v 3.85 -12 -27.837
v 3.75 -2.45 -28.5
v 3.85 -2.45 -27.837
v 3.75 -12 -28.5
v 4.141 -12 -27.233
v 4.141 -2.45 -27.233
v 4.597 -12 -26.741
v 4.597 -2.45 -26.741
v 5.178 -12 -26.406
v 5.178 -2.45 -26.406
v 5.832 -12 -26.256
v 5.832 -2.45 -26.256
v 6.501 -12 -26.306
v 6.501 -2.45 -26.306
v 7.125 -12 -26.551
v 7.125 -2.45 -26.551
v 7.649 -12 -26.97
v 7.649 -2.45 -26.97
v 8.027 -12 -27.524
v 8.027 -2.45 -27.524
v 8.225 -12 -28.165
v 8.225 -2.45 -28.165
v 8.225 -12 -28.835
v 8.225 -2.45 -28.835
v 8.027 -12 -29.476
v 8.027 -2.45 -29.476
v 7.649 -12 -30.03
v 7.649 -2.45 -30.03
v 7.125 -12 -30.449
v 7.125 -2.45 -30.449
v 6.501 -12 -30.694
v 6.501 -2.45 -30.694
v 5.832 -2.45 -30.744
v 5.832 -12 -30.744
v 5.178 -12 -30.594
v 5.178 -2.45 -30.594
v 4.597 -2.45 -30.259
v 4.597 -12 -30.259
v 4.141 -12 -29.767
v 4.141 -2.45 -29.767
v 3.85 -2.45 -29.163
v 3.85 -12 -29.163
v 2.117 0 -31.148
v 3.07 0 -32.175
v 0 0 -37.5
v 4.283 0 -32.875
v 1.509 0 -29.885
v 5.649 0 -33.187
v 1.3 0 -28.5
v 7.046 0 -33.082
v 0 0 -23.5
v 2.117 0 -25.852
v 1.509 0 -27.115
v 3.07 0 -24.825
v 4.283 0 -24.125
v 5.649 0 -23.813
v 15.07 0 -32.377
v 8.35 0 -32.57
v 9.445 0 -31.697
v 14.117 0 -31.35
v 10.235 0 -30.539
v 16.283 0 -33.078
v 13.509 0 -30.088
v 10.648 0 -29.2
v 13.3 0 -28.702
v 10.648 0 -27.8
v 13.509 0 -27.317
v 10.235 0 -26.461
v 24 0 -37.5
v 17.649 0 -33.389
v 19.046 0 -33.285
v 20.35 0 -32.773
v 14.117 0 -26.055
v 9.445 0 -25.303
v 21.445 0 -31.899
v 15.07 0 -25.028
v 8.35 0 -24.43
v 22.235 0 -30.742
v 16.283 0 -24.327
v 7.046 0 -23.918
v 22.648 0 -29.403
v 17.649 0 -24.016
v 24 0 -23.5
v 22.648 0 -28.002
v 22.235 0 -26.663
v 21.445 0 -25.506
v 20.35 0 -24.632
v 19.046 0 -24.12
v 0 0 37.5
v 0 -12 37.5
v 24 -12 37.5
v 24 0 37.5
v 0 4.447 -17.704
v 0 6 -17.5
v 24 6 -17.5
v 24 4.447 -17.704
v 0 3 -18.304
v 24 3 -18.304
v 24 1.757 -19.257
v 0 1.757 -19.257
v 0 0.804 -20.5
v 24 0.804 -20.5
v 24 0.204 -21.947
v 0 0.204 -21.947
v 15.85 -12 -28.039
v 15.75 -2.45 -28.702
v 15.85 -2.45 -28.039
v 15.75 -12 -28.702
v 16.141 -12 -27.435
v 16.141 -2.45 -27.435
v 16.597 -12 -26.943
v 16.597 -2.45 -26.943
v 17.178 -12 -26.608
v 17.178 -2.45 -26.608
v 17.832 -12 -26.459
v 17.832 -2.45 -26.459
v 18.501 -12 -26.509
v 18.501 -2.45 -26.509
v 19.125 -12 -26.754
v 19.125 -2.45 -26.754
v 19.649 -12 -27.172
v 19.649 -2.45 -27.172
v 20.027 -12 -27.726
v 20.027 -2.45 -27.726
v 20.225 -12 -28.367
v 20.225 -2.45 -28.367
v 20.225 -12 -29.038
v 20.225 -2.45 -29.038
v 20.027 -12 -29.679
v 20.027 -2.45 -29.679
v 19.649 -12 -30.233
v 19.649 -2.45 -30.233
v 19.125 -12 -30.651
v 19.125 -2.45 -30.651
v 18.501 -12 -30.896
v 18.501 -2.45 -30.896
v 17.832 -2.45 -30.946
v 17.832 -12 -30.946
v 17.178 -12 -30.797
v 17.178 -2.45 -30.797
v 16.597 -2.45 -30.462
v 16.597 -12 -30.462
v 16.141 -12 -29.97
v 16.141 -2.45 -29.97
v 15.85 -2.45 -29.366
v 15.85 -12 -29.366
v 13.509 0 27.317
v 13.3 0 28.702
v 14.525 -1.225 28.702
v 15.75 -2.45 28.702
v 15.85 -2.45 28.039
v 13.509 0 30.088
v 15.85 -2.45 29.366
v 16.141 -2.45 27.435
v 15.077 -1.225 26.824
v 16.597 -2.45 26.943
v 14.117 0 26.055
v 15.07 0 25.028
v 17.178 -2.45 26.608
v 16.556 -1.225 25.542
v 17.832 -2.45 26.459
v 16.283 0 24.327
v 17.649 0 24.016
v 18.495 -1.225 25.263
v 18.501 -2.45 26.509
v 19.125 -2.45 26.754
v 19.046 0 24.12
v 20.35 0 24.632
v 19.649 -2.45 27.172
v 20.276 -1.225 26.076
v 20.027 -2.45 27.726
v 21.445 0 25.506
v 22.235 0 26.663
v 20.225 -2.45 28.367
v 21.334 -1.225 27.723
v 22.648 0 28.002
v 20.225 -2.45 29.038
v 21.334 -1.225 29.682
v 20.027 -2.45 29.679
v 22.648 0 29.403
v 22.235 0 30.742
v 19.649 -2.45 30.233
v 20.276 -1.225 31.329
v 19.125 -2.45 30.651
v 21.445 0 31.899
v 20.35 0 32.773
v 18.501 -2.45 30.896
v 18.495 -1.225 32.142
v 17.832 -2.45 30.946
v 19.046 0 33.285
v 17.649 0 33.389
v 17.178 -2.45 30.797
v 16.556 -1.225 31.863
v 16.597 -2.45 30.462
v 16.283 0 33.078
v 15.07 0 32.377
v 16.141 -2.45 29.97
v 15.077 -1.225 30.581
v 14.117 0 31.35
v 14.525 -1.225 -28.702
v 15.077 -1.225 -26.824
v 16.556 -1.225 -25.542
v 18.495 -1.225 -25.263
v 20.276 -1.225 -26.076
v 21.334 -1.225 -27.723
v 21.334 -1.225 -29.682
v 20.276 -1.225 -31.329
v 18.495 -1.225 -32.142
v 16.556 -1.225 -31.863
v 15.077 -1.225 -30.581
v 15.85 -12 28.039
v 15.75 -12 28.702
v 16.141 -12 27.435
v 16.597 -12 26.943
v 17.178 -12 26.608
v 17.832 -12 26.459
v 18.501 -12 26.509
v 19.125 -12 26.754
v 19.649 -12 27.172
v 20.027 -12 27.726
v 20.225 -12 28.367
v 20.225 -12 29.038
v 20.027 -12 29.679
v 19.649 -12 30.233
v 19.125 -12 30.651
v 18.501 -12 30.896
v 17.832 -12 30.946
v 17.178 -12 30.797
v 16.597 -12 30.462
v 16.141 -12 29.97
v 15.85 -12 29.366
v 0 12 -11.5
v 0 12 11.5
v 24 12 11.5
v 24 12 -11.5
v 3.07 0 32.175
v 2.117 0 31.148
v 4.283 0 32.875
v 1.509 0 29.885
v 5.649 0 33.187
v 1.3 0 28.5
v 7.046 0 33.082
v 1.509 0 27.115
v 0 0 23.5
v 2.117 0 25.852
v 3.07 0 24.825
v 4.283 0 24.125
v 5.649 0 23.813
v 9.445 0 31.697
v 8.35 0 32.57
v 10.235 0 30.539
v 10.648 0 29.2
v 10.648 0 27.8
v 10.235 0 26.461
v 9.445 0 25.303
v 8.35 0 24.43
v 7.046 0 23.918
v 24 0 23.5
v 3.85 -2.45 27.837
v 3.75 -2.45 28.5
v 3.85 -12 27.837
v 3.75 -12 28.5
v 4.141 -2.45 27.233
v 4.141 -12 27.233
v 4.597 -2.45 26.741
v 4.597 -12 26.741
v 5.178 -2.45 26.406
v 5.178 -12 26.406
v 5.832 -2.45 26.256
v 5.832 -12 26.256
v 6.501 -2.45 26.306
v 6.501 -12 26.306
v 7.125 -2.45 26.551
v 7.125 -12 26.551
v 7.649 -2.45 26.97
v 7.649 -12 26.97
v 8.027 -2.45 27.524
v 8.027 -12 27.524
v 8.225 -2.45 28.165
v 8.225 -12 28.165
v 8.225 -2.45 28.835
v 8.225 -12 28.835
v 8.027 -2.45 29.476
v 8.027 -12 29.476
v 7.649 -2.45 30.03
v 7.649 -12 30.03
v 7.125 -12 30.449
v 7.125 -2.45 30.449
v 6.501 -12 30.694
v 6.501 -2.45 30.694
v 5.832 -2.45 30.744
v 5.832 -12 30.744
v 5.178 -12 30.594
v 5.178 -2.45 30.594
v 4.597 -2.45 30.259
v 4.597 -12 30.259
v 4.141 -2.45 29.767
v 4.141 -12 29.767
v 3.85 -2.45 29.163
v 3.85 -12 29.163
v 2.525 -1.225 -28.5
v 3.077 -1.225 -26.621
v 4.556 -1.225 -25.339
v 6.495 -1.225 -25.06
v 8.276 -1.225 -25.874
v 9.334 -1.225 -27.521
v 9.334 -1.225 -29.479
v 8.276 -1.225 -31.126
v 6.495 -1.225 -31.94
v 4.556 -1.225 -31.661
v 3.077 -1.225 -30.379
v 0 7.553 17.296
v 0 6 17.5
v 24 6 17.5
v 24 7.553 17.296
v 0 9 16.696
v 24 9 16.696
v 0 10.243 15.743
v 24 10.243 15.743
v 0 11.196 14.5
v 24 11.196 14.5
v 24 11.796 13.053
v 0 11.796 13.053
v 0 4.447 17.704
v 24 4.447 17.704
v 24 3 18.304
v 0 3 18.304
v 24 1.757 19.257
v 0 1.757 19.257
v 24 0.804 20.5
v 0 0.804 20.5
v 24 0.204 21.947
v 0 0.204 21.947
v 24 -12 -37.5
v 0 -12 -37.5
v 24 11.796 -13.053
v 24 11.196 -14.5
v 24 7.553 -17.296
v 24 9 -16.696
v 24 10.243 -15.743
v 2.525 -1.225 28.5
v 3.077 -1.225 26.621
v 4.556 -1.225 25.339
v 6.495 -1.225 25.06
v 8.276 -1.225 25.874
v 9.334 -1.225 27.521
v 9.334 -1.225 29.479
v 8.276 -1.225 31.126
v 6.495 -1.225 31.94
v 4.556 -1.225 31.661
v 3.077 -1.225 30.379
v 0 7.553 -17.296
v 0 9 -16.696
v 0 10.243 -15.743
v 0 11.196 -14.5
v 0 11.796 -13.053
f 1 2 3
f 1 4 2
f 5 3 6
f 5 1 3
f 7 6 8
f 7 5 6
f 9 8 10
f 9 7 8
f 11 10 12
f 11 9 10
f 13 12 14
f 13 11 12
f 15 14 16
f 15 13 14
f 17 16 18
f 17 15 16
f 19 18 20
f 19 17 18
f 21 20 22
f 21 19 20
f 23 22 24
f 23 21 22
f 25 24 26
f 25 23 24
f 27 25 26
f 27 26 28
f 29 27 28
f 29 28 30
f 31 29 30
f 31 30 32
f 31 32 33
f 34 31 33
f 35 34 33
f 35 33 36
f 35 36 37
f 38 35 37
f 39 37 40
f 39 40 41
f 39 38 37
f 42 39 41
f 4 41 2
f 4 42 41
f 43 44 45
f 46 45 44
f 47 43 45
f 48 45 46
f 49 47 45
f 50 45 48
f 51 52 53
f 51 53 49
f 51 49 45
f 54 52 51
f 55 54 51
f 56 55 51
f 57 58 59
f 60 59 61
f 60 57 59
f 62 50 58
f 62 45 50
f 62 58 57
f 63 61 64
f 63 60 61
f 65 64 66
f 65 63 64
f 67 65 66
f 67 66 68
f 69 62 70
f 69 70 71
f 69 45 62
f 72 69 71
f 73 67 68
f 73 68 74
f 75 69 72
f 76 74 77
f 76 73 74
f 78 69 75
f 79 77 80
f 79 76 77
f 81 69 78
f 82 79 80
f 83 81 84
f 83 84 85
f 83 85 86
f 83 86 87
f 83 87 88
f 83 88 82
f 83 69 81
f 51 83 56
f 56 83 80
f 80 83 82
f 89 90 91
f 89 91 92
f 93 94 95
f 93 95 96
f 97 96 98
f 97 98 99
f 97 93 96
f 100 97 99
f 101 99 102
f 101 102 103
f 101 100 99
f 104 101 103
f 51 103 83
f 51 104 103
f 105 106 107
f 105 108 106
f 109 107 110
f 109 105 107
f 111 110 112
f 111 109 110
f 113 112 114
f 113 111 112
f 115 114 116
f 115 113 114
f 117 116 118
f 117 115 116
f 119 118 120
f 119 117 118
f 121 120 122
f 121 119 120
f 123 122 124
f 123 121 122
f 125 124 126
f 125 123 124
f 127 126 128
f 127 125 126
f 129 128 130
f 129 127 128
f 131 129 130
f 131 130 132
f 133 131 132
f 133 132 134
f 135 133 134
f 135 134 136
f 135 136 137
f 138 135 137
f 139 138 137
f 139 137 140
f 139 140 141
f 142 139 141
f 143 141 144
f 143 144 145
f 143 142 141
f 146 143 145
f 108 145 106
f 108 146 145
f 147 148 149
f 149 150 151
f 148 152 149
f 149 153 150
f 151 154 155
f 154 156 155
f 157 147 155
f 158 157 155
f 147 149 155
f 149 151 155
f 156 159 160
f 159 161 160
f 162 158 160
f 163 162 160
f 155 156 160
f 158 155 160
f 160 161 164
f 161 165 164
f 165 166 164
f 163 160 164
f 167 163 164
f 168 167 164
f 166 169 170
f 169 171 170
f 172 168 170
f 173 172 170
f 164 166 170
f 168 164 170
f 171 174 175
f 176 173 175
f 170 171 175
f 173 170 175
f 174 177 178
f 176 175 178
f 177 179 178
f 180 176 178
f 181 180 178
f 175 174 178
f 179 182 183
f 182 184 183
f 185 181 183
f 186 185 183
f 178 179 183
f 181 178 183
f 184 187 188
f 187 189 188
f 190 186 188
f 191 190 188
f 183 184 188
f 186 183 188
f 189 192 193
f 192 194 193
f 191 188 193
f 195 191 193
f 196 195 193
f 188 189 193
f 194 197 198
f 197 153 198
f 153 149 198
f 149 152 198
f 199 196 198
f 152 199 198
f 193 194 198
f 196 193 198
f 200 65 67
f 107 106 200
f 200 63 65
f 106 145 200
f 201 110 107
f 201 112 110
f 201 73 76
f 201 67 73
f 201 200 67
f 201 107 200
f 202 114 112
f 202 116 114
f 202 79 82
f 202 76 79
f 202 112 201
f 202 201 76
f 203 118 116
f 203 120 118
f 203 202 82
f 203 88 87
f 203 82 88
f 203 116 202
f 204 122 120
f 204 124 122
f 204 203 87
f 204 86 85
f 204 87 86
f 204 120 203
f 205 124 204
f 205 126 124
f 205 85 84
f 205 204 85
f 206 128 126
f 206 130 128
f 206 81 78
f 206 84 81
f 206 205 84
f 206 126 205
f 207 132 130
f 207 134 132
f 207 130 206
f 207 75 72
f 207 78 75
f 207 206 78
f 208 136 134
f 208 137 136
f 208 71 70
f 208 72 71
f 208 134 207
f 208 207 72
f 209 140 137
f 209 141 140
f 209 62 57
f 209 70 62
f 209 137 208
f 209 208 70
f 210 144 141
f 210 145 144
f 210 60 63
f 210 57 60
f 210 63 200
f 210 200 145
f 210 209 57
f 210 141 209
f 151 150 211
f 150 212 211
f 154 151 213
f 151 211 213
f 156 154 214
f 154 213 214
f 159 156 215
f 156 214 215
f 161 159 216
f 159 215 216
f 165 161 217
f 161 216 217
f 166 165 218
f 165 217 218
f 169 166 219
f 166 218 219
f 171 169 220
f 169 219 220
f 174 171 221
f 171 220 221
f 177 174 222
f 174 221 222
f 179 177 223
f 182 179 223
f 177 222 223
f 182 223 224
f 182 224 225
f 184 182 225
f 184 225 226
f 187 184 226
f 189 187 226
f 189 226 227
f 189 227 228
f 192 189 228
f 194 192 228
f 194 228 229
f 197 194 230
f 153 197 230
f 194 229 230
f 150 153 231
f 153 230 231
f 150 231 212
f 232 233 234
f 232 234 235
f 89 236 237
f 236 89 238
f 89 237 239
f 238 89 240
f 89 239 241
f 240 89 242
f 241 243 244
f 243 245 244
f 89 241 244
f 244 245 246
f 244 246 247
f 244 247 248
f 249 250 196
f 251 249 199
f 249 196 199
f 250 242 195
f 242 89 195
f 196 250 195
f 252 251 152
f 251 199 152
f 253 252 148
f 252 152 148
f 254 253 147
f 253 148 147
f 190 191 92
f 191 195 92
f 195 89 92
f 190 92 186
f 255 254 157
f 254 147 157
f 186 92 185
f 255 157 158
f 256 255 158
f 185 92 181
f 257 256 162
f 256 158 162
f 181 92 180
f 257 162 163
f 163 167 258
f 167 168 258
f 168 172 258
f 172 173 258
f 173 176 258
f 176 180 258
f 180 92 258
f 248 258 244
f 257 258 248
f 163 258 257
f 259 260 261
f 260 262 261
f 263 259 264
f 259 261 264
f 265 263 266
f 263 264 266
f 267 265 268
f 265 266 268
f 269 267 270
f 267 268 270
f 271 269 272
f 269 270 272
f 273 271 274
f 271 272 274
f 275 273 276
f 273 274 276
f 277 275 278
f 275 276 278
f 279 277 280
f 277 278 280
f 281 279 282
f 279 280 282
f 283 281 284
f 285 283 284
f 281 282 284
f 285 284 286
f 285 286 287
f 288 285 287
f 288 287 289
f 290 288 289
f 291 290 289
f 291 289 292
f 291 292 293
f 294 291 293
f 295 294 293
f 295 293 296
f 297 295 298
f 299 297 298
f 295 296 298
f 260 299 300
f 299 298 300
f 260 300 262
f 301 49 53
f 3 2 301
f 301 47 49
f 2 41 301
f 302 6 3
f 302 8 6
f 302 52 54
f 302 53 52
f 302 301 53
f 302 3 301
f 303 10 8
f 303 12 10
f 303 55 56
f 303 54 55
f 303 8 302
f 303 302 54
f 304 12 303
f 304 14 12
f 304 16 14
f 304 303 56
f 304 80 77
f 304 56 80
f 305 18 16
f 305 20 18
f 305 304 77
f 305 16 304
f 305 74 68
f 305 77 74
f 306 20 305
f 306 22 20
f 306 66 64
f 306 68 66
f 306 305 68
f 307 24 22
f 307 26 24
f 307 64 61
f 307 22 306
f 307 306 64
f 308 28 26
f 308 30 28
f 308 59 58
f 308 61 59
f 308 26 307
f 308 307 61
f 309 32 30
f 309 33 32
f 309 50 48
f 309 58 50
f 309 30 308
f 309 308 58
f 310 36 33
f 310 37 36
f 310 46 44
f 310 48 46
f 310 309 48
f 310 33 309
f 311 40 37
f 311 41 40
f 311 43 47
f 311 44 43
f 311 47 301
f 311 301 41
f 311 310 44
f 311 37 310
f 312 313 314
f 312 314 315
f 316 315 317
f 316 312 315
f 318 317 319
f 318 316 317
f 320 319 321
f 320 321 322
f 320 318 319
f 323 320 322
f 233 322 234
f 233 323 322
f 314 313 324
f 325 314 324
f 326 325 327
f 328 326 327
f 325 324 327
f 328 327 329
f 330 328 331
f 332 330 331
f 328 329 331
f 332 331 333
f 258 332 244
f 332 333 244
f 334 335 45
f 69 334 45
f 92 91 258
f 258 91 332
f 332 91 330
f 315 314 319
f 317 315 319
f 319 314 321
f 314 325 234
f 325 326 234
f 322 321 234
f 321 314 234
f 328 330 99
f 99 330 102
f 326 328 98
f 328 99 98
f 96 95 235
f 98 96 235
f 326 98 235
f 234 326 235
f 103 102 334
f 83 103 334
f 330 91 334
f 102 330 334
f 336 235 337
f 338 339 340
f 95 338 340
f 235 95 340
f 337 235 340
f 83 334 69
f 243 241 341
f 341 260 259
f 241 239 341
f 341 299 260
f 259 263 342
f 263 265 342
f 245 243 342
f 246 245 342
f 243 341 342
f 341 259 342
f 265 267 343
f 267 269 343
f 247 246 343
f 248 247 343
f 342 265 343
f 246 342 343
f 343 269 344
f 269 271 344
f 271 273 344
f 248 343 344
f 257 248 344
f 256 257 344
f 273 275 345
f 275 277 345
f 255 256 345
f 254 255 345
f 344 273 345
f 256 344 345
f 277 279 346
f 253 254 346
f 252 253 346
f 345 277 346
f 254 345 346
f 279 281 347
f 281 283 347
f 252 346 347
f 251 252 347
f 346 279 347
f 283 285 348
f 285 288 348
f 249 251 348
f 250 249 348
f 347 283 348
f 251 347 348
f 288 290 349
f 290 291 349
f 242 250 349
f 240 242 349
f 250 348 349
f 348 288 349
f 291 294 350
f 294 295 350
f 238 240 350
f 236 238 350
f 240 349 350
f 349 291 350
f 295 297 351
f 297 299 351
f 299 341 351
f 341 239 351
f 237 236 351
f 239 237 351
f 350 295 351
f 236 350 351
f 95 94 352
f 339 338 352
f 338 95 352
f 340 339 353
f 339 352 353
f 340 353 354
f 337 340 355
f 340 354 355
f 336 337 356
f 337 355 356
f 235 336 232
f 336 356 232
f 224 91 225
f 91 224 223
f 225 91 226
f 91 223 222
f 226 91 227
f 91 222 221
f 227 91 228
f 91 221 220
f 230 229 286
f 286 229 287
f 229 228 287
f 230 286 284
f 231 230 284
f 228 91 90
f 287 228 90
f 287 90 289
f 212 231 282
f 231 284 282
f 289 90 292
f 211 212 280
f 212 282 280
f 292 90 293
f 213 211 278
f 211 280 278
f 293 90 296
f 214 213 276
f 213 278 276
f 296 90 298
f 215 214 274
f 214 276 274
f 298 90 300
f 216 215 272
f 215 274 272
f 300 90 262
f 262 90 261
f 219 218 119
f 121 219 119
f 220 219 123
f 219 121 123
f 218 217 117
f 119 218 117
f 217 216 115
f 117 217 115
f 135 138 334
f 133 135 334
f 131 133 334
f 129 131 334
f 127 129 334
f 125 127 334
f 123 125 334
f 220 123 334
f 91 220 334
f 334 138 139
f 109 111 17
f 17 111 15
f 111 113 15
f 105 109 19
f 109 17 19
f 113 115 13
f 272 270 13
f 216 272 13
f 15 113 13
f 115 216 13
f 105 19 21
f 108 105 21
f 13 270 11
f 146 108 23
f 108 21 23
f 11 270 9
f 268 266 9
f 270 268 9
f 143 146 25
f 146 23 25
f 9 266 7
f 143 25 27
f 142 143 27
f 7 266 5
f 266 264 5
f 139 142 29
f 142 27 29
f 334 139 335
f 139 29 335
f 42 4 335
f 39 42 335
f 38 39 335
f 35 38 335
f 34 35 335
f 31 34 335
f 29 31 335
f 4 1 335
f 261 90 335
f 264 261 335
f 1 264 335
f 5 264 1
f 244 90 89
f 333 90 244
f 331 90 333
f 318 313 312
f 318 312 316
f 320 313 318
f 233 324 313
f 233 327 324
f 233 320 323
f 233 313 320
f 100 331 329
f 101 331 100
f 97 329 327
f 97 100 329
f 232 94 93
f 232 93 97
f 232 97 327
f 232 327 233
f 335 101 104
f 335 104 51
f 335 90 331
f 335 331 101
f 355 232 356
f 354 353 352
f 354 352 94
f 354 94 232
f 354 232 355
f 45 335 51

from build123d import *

# Parameters (mm, degrees)
SKETCH1_W                                       = 75
SKETCH1_H                                       = 24
BOSS_EXTRUDE1_DEPTH                             = 24
SKETCH2_W                                       = 20
SKETCH2_H                                       = 12
CUT_EXTRUDE1_DEPTH                              = 24
FILLET1_START                                   = -1
FILLET1_DEPTH                                   = 26
FILLET1_2_DEPTH                                 = 24
CSK_FOR_M4_FLAT_HEAD_MACHINE_SCREW1_D           = 4.5
CSK_FOR_M4_FLAT_HEAD_MACHINE_SCREW1_CSINK_D     = 9.4
CSK_FOR_M4_FLAT_HEAD_MACHINE_SCREW1_CSINK_ANGLE = 90


with BuildPart() as part:
    # Sketch1 → Boss-Extrude1 (new body)
    with BuildSketch(Plane(origin=(0, 0, 0), x_dir=(0, 0, -1), z_dir=(1, 0, 0))):
        Rectangle(SKETCH1_W, SKETCH1_H)
    extrude(amount=BOSS_EXTRUDE1_DEPTH)

    # Sketch2 → Cut-Extrude1 (cut)
    with BuildSketch(Plane(origin=(24, 0, 0), x_dir=(0, 0, -1), z_dir=(1, 0, 0))):
        with Locations((-27.5, 6)):
            Rectangle(SKETCH2_W, SKETCH2_H)
    cut_extrude1 = extrude(amount=-CUT_EXTRUDE1_DEPTH, mode=Mode.SUBTRACT)

    # Fillet1: read off the stored shape, not the designer's step
    # Fillet1 outline → Fillet1 (cut)
    with BuildSketch(Plane.YZ.offset(FILLET1_START)):
        with BuildLine():
            Line((12, 17.5), (6, 17.5))
            ThreePointArc((6, 17.5), (10.242640687, 15.742640687), (12, 11.5))
            Line((12, 11.5), (12, 17.5))
        make_face()
    fillet1 = extrude(amount=FILLET1_DEPTH, mode=Mode.SUBTRACT)

    # Fillet1 2 outline → Fillet1 2 (add)
    with BuildSketch(Plane.YZ):
        with BuildLine():
            Line((0, 17.5), (6, 17.5))
            ThreePointArc((6, 17.5), (1.757359313, 19.257359313), (0, 23.5))
            Line((0, 23.5), (0, 17.5))
        make_face()
    fillet1_2 = extrude(amount=FILLET1_2_DEPTH)

    # CSK for M4 Flat Head Machine Screw1 (through all)
    with Locations(Plane(origin=(0, 0, 0), x_dir=(1, 0, 0), z_dir=(0, 1, 0))):
        with Locations((6, -28.5), (18, -28.702489343)):
            csk_for_m4_flat_head_machine_screw1 = CounterSinkHole(CSK_FOR_M4_FLAT_HEAD_MACHINE_SCREW1_D / 2, CSK_FOR_M4_FLAT_HEAD_MACHINE_SCREW1_CSINK_D / 2, counter_sink_angle=CSK_FOR_M4_FLAT_HEAD_MACHINE_SCREW1_CSINK_ANGLE)

    # Mirror1: Cut-Extrude1, Fillet1, Fillet1 2, CSK for M4 Flat Head Machine Screw1 across plane
    add(cut_extrude1.mirror(Plane.XY), mode=Mode.SUBTRACT)
    add(fillet1.mirror(Plane.XY), mode=Mode.SUBTRACT)
    add(fillet1_2.mirror(Plane.XY))
    add(csk_for_m4_flat_head_machine_screw1.mirror(Plane.XY), mode=Mode.SUBTRACT)


solid = part.part
